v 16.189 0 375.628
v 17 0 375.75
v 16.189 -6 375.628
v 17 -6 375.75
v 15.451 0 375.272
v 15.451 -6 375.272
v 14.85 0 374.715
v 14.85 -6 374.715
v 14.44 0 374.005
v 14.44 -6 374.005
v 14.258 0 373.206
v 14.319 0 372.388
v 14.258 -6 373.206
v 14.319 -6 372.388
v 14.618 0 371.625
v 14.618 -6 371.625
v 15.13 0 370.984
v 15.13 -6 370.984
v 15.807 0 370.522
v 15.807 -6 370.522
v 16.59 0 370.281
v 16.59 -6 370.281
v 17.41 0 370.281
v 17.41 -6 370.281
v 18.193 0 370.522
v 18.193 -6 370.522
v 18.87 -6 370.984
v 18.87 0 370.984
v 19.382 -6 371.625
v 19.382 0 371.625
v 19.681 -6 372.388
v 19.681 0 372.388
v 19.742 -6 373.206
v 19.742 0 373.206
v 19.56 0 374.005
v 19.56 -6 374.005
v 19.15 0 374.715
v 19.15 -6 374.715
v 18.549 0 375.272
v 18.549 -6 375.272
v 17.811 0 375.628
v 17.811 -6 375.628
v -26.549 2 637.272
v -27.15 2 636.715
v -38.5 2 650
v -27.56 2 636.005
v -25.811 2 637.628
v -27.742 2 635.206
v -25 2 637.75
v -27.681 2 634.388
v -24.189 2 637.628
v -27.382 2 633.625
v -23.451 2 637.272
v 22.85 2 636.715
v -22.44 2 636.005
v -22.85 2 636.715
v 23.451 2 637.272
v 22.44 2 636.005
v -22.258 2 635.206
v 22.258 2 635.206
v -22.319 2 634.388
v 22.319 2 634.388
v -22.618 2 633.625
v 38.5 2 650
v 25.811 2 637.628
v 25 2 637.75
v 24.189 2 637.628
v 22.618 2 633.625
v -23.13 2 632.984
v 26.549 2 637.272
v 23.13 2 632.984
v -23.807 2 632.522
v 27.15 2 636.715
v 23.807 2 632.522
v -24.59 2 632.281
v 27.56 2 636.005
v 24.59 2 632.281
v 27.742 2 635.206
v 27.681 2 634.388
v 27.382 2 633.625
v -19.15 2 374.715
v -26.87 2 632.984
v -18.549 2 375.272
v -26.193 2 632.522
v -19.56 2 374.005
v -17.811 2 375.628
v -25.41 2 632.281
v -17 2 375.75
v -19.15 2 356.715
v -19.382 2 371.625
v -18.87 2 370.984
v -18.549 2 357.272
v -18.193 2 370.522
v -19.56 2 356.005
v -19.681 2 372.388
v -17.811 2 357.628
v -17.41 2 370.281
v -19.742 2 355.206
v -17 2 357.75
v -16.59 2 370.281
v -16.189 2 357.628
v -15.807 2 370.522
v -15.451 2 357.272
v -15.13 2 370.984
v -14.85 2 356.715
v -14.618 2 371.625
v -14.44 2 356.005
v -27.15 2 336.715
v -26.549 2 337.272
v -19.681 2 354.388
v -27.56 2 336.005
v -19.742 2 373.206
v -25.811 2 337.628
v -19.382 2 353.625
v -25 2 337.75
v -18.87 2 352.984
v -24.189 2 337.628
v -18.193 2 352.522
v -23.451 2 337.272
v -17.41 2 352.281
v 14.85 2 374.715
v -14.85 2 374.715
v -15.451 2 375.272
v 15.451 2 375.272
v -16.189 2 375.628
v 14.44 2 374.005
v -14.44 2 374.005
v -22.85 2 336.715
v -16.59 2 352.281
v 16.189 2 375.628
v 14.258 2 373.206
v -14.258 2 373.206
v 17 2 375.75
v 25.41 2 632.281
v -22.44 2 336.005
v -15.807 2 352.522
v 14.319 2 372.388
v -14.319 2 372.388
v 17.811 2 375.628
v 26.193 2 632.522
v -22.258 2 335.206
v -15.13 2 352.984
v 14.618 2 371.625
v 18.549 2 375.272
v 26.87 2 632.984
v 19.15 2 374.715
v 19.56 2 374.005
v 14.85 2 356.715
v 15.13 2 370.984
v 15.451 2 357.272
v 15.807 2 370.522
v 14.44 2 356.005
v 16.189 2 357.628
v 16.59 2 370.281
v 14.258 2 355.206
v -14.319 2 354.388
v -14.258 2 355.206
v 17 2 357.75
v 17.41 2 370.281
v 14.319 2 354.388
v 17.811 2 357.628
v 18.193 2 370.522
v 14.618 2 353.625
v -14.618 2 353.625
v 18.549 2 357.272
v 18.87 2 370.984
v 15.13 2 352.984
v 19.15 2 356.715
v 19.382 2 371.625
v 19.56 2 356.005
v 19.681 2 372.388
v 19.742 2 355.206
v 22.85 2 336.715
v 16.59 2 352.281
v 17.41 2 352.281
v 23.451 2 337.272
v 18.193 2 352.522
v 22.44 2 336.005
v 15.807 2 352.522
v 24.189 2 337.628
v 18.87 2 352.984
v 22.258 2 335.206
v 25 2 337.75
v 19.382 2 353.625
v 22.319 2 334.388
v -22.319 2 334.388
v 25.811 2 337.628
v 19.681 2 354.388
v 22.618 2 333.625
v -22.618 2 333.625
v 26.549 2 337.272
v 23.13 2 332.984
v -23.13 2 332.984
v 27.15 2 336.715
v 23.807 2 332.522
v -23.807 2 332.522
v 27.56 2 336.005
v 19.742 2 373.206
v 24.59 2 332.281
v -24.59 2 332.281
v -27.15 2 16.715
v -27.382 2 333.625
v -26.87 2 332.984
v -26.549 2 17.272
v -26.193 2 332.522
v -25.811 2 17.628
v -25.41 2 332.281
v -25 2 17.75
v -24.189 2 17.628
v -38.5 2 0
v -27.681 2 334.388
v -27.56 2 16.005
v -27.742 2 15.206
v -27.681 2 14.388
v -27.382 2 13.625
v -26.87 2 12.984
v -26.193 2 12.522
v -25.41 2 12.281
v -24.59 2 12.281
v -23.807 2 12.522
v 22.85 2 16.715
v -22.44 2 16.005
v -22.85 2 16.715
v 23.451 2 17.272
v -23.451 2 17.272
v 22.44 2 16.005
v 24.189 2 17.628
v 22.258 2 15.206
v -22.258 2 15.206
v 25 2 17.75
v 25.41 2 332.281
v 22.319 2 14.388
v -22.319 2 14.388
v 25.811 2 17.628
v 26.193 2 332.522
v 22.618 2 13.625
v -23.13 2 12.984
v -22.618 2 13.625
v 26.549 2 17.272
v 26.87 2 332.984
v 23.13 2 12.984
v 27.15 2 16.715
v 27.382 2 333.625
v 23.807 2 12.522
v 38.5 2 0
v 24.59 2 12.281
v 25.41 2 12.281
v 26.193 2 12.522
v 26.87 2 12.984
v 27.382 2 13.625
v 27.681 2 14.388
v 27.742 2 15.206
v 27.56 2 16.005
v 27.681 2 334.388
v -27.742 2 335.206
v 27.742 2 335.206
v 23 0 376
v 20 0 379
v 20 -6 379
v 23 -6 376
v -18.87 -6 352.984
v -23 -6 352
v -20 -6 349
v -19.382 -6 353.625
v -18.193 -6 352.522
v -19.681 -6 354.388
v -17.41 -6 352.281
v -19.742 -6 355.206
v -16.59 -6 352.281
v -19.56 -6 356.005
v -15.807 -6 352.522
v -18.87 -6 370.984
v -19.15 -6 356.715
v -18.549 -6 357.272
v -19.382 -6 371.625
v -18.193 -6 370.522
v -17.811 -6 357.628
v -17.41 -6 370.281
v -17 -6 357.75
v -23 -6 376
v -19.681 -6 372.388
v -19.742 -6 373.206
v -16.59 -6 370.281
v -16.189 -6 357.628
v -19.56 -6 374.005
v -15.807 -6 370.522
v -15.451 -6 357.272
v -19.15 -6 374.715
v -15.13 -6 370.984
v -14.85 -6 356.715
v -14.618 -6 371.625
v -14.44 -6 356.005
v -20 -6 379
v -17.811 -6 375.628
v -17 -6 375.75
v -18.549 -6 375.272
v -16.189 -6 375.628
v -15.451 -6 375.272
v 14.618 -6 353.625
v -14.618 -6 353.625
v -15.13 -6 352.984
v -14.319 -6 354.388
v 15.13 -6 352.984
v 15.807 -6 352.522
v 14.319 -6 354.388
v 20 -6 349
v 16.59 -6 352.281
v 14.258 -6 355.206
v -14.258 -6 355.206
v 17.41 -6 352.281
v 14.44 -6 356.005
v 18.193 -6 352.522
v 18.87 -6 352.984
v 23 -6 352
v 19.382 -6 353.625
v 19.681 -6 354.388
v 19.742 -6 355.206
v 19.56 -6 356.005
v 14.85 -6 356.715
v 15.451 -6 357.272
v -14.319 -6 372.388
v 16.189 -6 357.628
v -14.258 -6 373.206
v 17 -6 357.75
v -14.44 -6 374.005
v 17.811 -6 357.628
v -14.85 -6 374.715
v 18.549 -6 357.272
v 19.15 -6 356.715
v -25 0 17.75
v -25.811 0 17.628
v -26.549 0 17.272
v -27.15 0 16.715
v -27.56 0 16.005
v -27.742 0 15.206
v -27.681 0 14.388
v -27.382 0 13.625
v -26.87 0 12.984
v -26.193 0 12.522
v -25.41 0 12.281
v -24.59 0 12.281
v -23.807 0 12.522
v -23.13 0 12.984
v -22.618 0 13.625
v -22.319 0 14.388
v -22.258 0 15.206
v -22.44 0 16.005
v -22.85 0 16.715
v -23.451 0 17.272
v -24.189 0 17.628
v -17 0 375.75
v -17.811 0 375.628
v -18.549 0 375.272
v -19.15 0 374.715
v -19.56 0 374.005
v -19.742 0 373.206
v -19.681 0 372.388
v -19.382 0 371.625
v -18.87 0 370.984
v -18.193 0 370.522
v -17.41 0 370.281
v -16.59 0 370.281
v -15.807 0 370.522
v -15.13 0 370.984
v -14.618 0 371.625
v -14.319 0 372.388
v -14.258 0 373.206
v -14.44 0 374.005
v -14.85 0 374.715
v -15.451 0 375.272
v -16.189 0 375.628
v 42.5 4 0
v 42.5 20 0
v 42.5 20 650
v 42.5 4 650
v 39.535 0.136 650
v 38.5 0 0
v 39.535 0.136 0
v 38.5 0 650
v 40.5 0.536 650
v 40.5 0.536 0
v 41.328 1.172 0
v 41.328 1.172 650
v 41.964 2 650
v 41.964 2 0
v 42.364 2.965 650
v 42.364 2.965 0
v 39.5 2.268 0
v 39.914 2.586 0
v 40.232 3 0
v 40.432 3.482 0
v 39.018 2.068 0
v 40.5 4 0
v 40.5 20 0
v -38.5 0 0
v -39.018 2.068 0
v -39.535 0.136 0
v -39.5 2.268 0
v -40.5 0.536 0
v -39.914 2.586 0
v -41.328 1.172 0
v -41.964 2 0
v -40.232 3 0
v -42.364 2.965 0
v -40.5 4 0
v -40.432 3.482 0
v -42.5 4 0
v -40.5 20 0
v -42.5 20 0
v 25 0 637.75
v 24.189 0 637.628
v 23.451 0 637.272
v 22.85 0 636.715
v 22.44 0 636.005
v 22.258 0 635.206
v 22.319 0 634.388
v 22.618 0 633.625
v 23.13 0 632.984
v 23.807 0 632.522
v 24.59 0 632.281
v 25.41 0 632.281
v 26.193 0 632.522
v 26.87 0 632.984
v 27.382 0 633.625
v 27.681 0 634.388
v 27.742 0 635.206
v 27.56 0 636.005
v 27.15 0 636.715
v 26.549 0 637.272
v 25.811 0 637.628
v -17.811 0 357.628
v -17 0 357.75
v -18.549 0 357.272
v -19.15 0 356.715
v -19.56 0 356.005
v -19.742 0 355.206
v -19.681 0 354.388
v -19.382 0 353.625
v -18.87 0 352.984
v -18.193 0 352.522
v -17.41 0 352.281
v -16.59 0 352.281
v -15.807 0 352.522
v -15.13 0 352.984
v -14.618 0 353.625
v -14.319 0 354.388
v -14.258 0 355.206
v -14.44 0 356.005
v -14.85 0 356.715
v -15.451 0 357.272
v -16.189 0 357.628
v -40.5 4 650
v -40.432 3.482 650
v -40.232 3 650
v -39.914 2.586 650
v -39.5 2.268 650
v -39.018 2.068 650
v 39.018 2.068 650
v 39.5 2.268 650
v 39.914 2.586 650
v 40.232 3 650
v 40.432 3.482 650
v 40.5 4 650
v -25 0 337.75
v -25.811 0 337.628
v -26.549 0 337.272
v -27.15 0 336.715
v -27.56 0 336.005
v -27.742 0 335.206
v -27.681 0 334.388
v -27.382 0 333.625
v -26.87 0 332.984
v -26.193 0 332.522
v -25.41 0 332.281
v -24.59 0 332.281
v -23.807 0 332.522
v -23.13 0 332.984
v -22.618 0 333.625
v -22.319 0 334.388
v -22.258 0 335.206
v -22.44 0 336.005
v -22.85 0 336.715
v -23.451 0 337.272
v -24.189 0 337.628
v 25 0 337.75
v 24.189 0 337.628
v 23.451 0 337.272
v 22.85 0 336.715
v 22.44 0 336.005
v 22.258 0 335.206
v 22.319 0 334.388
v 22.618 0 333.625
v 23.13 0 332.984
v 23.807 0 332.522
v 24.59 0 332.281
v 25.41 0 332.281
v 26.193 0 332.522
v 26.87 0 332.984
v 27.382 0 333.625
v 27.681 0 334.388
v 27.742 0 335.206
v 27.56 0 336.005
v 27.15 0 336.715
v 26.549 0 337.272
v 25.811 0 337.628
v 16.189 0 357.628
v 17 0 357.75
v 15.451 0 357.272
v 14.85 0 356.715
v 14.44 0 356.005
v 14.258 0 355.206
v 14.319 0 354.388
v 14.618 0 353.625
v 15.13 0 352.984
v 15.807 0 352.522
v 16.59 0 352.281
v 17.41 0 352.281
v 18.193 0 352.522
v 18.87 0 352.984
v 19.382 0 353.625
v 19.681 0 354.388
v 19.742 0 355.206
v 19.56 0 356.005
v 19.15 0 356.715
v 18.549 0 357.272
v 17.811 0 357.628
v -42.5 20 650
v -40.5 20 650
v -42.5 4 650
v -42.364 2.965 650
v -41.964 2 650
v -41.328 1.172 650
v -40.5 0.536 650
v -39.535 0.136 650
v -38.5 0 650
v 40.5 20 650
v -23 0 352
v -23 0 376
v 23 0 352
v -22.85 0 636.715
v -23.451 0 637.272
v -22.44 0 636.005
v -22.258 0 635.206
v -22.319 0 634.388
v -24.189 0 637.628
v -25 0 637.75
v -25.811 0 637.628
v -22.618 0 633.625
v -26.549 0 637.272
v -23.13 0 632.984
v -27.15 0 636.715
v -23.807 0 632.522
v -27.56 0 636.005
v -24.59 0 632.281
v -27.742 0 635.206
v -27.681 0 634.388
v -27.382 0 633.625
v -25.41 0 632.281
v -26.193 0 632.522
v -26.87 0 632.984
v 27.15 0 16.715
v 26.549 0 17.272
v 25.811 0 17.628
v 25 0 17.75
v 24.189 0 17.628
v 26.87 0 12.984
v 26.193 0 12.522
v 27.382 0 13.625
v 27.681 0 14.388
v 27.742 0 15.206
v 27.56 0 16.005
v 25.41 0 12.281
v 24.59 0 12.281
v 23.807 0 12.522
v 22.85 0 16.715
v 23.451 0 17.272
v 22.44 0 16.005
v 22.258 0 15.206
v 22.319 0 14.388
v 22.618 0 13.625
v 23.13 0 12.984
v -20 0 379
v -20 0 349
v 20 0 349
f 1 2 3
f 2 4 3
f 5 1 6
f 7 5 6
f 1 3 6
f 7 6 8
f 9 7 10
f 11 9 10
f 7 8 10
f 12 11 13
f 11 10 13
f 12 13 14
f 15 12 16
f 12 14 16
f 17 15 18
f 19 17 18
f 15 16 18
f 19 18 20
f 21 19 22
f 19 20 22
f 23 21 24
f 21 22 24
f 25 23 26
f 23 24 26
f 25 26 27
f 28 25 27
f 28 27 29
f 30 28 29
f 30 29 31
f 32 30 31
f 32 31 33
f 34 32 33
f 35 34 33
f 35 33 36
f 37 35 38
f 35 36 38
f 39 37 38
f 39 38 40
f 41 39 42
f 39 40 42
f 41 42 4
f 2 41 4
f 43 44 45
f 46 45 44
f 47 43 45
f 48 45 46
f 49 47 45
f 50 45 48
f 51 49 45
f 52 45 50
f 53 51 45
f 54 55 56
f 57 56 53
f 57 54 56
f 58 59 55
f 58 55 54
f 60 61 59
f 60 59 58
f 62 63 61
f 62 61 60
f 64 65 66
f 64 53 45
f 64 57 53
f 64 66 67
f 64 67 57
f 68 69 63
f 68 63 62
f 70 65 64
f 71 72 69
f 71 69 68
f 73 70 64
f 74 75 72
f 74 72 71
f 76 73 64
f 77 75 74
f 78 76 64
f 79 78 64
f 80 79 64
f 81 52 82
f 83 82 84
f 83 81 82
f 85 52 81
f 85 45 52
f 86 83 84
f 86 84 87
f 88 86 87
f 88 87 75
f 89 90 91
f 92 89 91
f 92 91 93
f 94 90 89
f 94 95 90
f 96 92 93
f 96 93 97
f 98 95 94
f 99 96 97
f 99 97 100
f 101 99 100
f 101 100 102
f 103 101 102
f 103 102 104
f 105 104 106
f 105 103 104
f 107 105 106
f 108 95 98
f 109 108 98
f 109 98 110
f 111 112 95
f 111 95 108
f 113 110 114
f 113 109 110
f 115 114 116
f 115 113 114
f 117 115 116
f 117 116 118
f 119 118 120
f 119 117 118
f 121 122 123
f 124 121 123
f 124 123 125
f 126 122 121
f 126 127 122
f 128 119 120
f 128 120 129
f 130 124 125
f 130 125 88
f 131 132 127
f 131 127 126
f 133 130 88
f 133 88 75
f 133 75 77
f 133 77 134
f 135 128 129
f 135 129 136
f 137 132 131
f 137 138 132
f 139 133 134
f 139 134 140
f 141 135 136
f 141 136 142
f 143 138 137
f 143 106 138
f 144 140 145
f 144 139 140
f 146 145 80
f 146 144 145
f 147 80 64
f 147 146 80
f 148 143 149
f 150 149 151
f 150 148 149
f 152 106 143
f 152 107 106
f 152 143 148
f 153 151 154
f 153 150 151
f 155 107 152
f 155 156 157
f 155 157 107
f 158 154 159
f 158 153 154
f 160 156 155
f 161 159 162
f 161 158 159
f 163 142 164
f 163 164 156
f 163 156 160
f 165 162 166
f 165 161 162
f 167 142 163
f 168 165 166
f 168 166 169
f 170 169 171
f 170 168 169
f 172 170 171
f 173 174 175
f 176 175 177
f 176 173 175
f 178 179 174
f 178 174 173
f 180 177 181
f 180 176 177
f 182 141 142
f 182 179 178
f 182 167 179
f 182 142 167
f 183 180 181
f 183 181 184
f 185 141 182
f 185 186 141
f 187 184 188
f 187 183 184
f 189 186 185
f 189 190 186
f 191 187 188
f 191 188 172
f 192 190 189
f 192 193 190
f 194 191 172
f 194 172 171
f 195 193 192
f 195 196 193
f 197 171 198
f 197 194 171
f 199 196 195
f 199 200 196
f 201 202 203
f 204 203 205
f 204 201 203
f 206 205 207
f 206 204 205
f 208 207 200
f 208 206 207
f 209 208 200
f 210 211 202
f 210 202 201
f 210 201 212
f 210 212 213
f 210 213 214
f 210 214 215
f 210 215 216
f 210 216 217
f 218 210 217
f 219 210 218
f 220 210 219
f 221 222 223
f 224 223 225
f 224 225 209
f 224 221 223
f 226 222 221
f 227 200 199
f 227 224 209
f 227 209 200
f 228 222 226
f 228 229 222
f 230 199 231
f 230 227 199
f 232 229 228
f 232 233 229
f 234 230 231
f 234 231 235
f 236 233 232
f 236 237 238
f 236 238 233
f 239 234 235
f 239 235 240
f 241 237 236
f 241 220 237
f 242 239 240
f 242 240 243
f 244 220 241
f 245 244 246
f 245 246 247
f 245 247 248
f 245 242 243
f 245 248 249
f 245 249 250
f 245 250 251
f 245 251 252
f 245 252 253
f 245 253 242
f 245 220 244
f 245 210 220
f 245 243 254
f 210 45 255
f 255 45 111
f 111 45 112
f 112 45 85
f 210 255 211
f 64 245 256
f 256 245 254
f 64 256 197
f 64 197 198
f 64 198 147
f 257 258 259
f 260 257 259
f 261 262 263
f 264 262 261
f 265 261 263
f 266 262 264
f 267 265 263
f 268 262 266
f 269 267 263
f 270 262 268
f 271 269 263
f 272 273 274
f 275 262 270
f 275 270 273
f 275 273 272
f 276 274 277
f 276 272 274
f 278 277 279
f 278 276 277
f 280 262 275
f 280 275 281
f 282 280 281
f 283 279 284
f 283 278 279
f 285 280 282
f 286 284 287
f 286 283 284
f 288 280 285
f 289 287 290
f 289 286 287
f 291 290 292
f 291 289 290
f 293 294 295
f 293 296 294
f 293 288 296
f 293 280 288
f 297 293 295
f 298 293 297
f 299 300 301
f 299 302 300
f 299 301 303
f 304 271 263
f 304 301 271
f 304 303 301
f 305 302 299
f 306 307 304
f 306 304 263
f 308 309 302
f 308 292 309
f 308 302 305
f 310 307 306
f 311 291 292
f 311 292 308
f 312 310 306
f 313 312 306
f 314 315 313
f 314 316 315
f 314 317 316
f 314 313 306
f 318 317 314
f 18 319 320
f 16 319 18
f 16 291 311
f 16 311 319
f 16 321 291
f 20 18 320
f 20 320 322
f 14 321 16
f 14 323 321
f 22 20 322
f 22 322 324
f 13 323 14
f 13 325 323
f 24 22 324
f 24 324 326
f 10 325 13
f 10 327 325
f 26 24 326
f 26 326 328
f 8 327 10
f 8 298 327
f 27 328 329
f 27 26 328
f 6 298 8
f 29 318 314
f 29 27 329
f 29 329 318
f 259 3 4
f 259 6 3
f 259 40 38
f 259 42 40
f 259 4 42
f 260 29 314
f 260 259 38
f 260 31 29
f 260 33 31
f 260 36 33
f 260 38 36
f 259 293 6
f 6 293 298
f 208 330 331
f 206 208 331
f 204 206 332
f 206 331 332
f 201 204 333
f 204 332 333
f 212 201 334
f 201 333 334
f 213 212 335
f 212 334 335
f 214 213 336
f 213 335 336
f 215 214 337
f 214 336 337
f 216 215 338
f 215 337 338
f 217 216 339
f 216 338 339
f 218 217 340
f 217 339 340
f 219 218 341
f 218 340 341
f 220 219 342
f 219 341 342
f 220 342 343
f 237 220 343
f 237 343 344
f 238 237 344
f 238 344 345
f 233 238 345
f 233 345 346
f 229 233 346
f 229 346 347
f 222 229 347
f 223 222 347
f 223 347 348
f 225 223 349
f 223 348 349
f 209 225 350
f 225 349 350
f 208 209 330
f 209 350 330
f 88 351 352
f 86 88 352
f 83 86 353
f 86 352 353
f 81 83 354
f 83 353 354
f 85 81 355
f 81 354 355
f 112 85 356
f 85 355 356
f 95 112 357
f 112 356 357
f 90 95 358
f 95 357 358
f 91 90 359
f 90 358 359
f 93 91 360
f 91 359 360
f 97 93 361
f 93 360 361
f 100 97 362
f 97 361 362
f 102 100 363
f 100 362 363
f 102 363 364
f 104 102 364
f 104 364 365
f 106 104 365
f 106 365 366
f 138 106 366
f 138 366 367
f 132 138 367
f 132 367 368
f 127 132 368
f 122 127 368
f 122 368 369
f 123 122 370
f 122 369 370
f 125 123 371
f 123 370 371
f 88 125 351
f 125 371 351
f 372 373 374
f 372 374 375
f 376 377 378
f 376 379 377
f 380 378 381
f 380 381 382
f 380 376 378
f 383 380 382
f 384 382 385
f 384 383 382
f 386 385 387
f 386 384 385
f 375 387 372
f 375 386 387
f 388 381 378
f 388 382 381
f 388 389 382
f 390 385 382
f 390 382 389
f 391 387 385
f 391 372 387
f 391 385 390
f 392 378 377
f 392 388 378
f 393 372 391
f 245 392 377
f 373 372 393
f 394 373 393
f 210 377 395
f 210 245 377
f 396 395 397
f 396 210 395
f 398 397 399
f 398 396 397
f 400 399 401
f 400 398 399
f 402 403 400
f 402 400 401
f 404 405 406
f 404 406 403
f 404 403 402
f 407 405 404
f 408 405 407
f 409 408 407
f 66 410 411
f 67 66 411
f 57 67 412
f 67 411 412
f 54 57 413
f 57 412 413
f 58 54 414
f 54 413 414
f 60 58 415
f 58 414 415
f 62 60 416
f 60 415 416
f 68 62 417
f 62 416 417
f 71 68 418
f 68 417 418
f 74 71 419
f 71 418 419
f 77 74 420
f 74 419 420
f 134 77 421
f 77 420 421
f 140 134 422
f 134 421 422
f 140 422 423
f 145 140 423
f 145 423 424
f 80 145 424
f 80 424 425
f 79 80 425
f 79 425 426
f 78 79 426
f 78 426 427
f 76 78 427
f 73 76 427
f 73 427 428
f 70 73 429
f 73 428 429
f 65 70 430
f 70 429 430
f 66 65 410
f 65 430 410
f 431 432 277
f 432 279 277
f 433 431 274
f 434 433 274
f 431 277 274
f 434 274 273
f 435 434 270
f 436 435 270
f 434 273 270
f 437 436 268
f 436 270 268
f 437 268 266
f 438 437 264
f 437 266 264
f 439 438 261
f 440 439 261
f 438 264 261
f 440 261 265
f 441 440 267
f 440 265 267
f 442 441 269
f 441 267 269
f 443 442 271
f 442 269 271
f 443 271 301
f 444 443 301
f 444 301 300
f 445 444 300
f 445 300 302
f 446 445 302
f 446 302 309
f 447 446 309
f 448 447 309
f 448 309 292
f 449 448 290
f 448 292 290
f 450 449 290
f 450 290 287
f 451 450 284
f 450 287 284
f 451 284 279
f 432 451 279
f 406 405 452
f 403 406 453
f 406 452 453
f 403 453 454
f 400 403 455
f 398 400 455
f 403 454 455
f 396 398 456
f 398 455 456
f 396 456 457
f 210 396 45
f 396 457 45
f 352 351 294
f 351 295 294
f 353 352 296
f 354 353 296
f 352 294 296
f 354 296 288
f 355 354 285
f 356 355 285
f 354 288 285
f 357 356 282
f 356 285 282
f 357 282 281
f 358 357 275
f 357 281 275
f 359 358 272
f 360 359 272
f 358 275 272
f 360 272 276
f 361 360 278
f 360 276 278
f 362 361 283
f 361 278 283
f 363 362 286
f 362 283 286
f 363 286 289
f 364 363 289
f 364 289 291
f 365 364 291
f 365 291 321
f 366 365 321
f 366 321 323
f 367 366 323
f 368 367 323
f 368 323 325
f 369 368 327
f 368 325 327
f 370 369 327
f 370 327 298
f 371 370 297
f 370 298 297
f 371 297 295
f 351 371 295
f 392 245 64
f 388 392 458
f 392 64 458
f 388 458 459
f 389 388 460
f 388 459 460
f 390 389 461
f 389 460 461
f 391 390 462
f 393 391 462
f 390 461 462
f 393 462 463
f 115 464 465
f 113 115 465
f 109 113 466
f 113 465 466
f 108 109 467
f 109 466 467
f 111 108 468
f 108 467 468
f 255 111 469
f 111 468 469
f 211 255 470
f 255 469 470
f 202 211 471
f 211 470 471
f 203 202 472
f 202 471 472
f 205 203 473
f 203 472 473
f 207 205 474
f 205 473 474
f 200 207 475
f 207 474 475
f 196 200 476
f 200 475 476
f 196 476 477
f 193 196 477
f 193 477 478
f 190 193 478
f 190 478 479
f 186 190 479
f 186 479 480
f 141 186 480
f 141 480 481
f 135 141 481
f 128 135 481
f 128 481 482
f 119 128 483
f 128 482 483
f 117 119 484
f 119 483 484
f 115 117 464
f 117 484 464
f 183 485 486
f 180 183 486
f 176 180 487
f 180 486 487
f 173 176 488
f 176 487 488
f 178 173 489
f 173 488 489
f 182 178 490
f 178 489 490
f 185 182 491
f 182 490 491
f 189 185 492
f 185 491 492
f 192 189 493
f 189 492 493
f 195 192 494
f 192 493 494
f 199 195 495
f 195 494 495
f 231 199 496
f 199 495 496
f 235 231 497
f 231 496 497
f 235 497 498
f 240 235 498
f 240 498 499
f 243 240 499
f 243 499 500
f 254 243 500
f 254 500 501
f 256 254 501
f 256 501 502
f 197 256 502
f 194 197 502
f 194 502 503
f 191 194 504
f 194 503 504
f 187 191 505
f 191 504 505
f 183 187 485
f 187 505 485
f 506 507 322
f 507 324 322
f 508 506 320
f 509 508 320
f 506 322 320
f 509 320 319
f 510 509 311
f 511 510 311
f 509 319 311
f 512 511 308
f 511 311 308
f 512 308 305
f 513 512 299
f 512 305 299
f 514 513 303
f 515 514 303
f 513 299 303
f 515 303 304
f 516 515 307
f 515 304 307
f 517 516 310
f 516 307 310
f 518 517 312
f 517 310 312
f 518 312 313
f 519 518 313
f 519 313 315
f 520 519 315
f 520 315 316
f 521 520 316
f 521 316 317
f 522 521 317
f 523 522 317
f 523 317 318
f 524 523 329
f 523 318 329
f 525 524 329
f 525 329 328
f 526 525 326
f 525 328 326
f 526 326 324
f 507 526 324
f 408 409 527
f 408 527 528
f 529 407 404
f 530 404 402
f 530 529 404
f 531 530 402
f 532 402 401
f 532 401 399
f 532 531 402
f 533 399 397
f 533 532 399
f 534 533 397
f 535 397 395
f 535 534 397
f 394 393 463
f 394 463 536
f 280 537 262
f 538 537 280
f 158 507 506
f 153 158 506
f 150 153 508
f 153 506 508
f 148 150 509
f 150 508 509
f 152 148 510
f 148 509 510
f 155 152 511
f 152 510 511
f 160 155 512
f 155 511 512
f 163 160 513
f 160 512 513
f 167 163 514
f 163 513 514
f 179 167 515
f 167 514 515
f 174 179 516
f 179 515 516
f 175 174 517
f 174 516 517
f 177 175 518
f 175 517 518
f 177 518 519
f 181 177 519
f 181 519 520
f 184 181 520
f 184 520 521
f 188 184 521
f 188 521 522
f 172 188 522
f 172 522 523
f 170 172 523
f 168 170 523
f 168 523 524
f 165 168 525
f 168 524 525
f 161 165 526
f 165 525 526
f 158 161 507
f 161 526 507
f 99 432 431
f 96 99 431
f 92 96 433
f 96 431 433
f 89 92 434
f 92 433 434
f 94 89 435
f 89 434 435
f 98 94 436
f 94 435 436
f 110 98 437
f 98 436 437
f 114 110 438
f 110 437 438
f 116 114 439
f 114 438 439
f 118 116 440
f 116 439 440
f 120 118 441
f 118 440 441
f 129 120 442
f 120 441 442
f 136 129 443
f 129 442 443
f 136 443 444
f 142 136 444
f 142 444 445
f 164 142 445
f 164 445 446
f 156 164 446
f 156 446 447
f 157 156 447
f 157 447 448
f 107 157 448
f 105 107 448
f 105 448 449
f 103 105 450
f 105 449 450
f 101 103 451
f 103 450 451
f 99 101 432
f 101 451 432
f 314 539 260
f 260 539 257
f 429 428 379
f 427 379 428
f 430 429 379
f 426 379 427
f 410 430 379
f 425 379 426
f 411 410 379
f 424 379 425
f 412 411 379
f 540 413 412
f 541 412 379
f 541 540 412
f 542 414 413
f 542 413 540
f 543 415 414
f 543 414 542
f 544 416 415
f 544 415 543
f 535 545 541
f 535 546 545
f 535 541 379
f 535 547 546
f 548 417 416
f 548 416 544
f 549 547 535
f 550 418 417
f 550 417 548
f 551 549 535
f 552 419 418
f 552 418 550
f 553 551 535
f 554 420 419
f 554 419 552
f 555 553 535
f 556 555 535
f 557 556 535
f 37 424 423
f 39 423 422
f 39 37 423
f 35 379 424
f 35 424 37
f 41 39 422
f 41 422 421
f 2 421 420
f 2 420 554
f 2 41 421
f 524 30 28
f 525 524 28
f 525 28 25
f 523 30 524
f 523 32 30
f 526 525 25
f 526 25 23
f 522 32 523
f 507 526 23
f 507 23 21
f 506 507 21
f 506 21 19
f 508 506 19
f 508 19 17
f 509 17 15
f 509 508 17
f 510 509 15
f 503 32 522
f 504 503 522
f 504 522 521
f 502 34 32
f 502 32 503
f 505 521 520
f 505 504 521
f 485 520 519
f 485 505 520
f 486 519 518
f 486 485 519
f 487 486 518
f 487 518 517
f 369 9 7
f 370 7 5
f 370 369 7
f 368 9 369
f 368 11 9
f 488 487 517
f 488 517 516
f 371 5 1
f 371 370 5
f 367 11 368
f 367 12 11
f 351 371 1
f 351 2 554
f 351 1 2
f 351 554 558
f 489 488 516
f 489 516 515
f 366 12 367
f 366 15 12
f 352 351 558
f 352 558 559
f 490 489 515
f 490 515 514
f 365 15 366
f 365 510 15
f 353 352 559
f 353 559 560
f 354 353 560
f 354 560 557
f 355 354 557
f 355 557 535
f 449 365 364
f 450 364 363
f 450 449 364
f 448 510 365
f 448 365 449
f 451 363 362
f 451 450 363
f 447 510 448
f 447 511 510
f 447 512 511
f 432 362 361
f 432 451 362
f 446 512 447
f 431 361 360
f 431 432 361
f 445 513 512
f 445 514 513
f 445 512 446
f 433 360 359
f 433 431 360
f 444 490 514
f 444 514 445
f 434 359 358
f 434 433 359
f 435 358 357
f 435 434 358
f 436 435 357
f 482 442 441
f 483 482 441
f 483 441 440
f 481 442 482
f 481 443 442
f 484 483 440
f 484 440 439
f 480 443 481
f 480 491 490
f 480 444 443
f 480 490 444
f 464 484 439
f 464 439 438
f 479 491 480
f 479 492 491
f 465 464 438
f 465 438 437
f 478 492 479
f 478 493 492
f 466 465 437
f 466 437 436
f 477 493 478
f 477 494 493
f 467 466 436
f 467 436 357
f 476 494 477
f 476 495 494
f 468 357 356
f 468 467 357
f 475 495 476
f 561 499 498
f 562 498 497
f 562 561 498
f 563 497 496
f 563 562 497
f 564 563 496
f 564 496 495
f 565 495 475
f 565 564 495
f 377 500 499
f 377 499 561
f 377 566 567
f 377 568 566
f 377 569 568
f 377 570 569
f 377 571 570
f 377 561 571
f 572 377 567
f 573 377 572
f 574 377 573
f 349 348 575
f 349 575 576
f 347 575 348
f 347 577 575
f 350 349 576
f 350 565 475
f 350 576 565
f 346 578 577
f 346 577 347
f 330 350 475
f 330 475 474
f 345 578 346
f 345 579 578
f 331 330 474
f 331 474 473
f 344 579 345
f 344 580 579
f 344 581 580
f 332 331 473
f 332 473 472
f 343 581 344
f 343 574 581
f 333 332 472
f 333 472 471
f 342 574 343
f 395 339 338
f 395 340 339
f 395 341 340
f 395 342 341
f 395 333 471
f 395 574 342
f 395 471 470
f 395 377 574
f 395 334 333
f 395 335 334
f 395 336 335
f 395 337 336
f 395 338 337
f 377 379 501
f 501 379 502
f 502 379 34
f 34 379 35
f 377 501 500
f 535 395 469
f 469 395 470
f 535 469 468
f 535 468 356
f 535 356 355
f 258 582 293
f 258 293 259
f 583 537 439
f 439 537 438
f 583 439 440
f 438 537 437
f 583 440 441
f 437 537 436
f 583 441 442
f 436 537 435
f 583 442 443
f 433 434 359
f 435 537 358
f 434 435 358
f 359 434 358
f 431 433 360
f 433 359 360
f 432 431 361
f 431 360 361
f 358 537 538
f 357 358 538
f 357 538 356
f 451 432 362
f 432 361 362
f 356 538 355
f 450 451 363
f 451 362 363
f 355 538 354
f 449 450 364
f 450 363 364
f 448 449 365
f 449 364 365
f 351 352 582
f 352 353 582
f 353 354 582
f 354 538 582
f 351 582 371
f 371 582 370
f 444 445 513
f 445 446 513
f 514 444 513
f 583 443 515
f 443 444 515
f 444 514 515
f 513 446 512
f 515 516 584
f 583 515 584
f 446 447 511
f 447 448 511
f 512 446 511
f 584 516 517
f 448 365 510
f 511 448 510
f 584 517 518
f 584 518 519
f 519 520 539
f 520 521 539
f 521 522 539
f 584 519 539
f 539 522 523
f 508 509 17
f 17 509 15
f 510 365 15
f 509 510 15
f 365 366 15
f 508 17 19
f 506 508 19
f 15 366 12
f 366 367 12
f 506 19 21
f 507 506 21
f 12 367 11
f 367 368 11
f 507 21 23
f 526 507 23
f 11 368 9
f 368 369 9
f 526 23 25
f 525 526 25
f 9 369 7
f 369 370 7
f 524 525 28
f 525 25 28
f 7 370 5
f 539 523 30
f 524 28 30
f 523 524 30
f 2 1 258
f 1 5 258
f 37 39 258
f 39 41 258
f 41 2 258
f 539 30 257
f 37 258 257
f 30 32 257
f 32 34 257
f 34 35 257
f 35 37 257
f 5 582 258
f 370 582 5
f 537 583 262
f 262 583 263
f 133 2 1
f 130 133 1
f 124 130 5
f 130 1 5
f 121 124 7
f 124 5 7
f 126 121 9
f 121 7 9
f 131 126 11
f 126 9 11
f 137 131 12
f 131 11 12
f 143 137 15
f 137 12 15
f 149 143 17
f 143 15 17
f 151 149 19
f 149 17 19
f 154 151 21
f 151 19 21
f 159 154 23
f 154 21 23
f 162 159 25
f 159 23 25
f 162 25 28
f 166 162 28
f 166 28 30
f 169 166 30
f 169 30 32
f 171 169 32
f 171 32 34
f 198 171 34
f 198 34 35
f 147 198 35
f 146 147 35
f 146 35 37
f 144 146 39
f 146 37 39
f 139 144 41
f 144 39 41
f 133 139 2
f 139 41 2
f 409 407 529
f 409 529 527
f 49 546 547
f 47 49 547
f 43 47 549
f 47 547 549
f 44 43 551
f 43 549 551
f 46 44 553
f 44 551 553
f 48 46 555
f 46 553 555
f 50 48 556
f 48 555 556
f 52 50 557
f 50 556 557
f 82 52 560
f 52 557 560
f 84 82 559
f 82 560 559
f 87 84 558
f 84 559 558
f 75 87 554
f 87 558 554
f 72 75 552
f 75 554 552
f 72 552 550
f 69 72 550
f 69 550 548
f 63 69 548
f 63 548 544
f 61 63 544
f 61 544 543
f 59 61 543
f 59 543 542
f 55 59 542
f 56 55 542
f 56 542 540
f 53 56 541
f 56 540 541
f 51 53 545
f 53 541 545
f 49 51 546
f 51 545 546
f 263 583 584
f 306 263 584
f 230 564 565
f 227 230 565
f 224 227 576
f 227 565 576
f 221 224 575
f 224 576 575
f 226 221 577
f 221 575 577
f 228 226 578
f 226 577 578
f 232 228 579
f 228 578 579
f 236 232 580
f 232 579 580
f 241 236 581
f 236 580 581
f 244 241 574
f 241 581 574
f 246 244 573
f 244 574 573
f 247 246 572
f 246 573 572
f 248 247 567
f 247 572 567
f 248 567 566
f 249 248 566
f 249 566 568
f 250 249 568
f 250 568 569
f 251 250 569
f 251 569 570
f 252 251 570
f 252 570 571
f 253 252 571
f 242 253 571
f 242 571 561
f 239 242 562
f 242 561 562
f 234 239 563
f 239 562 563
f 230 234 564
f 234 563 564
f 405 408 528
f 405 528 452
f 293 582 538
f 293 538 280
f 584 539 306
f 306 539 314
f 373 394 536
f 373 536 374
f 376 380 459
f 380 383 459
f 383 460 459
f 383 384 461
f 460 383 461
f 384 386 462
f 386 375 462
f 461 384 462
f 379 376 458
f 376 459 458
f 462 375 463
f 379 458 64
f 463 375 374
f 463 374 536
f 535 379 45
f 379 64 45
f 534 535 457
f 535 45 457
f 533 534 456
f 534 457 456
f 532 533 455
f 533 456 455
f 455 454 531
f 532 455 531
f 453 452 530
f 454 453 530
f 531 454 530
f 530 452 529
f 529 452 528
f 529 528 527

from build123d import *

# Parameters (mm, degrees)
BOSS_EXTRUDE1_DEPTH           = 650
FILLET1_R                     = 2
FILLET2_R                     = 4
SKETCH2_W                     = 46
SKETCH2_H                     = 30
BOSS_EXTRUDE2_DEPTH           = 6
CHAMFER1_SIZE                 = 3
SKETCH3_W                     = 2.75
SKETCH3_H                     = 8
M5_CLEARANCE_HOLE1_AT_2_COUNT = 2
M5_CLEARANCE_HOLE1_AT_2_PITCH = 620
M5_CLEARANCE_HOLE1_AT_3_COUNT = 2
M5_CLEARANCE_HOLE1_AT_3_PITCH = 50
M5_CLEARANCE_HOLE1_AT_4_COUNT = 2
M5_CLEARANCE_HOLE1_AT_4_PITCH = 323.882694814
M5_CLEARANCE_HOLE1_AT_5_COUNT = 2
M5_CLEARANCE_HOLE1_AT_5_PITCH = 320
M5_CLEARANCE_HOLE1_AT_6_COUNT = 2
M5_CLEARANCE_HOLE1_AT_6_PITCH = 622.012861603
SKETCH5_W                     = 2.75
SKETCH5_H                     = 8
M5_CLEARANCE_HOLE2_AT_2_COUNT = 2
M5_CLEARANCE_HOLE2_AT_2_PITCH = 34
M5_CLEARANCE_HOLE2_AT_3_COUNT = 2
M5_CLEARANCE_HOLE2_AT_3_PITCH = 38.470768123
M5_CLEARANCE_HOLE2_AT_4_COUNT = 2
M5_CLEARANCE_HOLE2_AT_4_PITCH = 18


with BuildPart() as part:
    # Sketch1 → Boss-Extrude1 (new body)
    with BuildSketch(Plane.XY):
        Polygon((40.5, 20), (42.5, 20), (42.5, 0), (-42.5, 0), (-42.5, 20), (-40.5, 20), (-40.5, 2), (40.5, 2), align=None)
    extrude(amount=BOSS_EXTRUDE1_DEPTH)

    # Fillet1
    fillet1_edges = [part.edges().sort_by_distance(p)[0] for p in [
        (-40.5, 2, 325),
        (40.5, 2, 325),
    ]]
    fillet(fillet1_edges, radius=FILLET1_R)

    # Fillet2
    fillet2_edges = [part.edges().sort_by_distance(p)[0] for p in [
        (42.5, 0, 325),
        (-42.5, 0, 325),
    ]]
    fillet(fillet2_edges, radius=FILLET2_R)

    # Sketch3 → M5 Clearance Hole1 (revolve, cut)
    with BuildSketch(Plane(origin=(-25, 2, 15), x_dir=(0, 0, 1), z_dir=(1, 0, 0))):
        with Locations((1.375, 4)):
            Rectangle(SKETCH3_W, SKETCH3_H)
    m5_clearance_hole1 = revolve(axis=Axis((-25, 8.35, 15), (0, -1, 0)), mode=Mode.SUBTRACT)

    # M5 Clearance Hole1 at 2: M5 Clearance Hole1 ×2
    with Locations(*[(0, 0, i * M5_CLEARANCE_HOLE1_AT_2_PITCH) for i in range(1, M5_CLEARANCE_HOLE1_AT_2_COUNT)]):
        add(m5_clearance_hole1, mode=Mode.SUBTRACT)

    # M5 Clearance Hole1 at 3: M5 Clearance Hole1 ×2
    with Locations(*[(i * M5_CLEARANCE_HOLE1_AT_3_PITCH, 0, 0) for i in range(1, M5_CLEARANCE_HOLE1_AT_3_COUNT)]):
        add(m5_clearance_hole1, mode=Mode.SUBTRACT)

    # M5 Clearance Hole1 at 4: M5 Clearance Hole1 ×2
    with Locations(*[Vector(0.15437688, 0, 0.988012034) * (i * M5_CLEARANCE_HOLE1_AT_4_PITCH) for i in range(1, M5_CLEARANCE_HOLE1_AT_4_COUNT)]):
        add(m5_clearance_hole1, mode=Mode.SUBTRACT)

    # M5 Clearance Hole1 at 5: M5 Clearance Hole1 ×2
    with Locations(*[(0, 0, i * M5_CLEARANCE_HOLE1_AT_5_PITCH) for i in range(1, M5_CLEARANCE_HOLE1_AT_5_COUNT)]):
        add(m5_clearance_hole1, mode=Mode.SUBTRACT)

    # M5 Clearance Hole1 at 6: M5 Clearance Hole1 ×2
    with Locations(*[Vector(0.08038419, 0, 0.996763955) * (i * M5_CLEARANCE_HOLE1_AT_6_PITCH) for i in range(1, M5_CLEARANCE_HOLE1_AT_6_COUNT)]):
        add(m5_clearance_hole1, mode=Mode.SUBTRACT)


with BuildPart() as body_2:
    # Sketch2 → Boss-Extrude2 (new body)
    with BuildSketch(Plane.XZ):
        with Locations((0, 364)):
            Rectangle(SKETCH2_W, SKETCH2_H)
    extrude(amount=BOSS_EXTRUDE2_DEPTH)

    # Chamfer1
    chamfer1_edges = [body_2.edges().sort_by_distance(p)[0] for p in [
        (23, -3, 349),
        (-23, -3, 349),
        (-23, -3, 379),
        (23, -3, 379),
    ]]
    chamfer(chamfer1_edges, length=CHAMFER1_SIZE)


with BuildPart() as m5_clearance_hole2_tool:
    # Sketch5 → M5 Clearance Hole2 (revolve)
    with BuildSketch(Plane(origin=(17, 2, 355), x_dir=(0, 0, 1), z_dir=(1, 0, 0))):
        with Locations((1.375, 4)):
            Rectangle(SKETCH5_W, SKETCH5_H)
    m5_clearance_hole2 = revolve(axis=Axis((17, 8.35, 355), (0, -1, 0)))


with BuildPart() as part_1:
    add(part.part)

    # M5 Clearance Hole2: cut by m5_clearance_hole2_tool
    add(m5_clearance_hole2_tool.part, mode=Mode.SUBTRACT)


with BuildPart() as body_2_1:
    add(body_2.part)

    # M5 Clearance Hole2: cut by m5_clearance_hole2_tool
    add(m5_clearance_hole2_tool.part, mode=Mode.SUBTRACT)


with BuildPart() as m5_clearance_hole2_at_2_tool:
    # M5 Clearance Hole2 at 2: M5 Clearance Hole2 ×2
    with Locations(*[(-i * M5_CLEARANCE_HOLE2_AT_2_PITCH, 0, 0) for i in range(1, M5_CLEARANCE_HOLE2_AT_2_COUNT)]):
        add(m5_clearance_hole2)


with BuildPart() as part_2:
    add(part_1.part)

    # M5 Clearance Hole2 at 2: cut by m5_clearance_hole2_at_2_tool
    add(m5_clearance_hole2_at_2_tool.part, mode=Mode.SUBTRACT)


with BuildPart() as body_2_2:
    add(body_2_1.part)

    # M5 Clearance Hole2 at 2: cut by m5_clearance_hole2_at_2_tool
    add(m5_clearance_hole2_at_2_tool.part, mode=Mode.SUBTRACT)


with BuildPart() as m5_clearance_hole2_at_3_tool:
    # M5 Clearance Hole2 at 3: M5 Clearance Hole2 ×2
    with Locations(*[Vector(-0.883787916, 0, 0.46788772) * (i * M5_CLEARANCE_HOLE2_AT_3_PITCH) for i in range(1, M5_CLEARANCE_HOLE2_AT_3_COUNT)]):
        add(m5_clearance_hole2)


with BuildPart() as part_3:
    add(part_2.part)

    # M5 Clearance Hole2 at 3: cut by m5_clearance_hole2_at_3_tool
    add(m5_clearance_hole2_at_3_tool.part, mode=Mode.SUBTRACT)


with BuildPart() as body_2_3:
    add(body_2_2.part)

    # M5 Clearance Hole2 at 3: cut by m5_clearance_hole2_at_3_tool
    add(m5_clearance_hole2_at_3_tool.part, mode=Mode.SUBTRACT)


with BuildPart() as m5_clearance_hole2_at_4_tool:
    # M5 Clearance Hole2 at 4: M5 Clearance Hole2 ×2
    with Locations(*[(0, 0, i * M5_CLEARANCE_HOLE2_AT_4_PITCH) for i in range(1, M5_CLEARANCE_HOLE2_AT_4_COUNT)]):
        add(m5_clearance_hole2)


with BuildPart() as part_4:
    add(part_3.part)

    # M5 Clearance Hole2 at 4: cut by m5_clearance_hole2_at_4_tool
    add(m5_clearance_hole2_at_4_tool.part, mode=Mode.SUBTRACT)


with BuildPart() as body_2_4:
    add(body_2_3.part)

    # M5 Clearance Hole2 at 4: cut by m5_clearance_hole2_at_4_tool
    add(m5_clearance_hole2_at_4_tool.part, mode=Mode.SUBTRACT)


solid = Compound([part_4.part, body_2_4.part])
